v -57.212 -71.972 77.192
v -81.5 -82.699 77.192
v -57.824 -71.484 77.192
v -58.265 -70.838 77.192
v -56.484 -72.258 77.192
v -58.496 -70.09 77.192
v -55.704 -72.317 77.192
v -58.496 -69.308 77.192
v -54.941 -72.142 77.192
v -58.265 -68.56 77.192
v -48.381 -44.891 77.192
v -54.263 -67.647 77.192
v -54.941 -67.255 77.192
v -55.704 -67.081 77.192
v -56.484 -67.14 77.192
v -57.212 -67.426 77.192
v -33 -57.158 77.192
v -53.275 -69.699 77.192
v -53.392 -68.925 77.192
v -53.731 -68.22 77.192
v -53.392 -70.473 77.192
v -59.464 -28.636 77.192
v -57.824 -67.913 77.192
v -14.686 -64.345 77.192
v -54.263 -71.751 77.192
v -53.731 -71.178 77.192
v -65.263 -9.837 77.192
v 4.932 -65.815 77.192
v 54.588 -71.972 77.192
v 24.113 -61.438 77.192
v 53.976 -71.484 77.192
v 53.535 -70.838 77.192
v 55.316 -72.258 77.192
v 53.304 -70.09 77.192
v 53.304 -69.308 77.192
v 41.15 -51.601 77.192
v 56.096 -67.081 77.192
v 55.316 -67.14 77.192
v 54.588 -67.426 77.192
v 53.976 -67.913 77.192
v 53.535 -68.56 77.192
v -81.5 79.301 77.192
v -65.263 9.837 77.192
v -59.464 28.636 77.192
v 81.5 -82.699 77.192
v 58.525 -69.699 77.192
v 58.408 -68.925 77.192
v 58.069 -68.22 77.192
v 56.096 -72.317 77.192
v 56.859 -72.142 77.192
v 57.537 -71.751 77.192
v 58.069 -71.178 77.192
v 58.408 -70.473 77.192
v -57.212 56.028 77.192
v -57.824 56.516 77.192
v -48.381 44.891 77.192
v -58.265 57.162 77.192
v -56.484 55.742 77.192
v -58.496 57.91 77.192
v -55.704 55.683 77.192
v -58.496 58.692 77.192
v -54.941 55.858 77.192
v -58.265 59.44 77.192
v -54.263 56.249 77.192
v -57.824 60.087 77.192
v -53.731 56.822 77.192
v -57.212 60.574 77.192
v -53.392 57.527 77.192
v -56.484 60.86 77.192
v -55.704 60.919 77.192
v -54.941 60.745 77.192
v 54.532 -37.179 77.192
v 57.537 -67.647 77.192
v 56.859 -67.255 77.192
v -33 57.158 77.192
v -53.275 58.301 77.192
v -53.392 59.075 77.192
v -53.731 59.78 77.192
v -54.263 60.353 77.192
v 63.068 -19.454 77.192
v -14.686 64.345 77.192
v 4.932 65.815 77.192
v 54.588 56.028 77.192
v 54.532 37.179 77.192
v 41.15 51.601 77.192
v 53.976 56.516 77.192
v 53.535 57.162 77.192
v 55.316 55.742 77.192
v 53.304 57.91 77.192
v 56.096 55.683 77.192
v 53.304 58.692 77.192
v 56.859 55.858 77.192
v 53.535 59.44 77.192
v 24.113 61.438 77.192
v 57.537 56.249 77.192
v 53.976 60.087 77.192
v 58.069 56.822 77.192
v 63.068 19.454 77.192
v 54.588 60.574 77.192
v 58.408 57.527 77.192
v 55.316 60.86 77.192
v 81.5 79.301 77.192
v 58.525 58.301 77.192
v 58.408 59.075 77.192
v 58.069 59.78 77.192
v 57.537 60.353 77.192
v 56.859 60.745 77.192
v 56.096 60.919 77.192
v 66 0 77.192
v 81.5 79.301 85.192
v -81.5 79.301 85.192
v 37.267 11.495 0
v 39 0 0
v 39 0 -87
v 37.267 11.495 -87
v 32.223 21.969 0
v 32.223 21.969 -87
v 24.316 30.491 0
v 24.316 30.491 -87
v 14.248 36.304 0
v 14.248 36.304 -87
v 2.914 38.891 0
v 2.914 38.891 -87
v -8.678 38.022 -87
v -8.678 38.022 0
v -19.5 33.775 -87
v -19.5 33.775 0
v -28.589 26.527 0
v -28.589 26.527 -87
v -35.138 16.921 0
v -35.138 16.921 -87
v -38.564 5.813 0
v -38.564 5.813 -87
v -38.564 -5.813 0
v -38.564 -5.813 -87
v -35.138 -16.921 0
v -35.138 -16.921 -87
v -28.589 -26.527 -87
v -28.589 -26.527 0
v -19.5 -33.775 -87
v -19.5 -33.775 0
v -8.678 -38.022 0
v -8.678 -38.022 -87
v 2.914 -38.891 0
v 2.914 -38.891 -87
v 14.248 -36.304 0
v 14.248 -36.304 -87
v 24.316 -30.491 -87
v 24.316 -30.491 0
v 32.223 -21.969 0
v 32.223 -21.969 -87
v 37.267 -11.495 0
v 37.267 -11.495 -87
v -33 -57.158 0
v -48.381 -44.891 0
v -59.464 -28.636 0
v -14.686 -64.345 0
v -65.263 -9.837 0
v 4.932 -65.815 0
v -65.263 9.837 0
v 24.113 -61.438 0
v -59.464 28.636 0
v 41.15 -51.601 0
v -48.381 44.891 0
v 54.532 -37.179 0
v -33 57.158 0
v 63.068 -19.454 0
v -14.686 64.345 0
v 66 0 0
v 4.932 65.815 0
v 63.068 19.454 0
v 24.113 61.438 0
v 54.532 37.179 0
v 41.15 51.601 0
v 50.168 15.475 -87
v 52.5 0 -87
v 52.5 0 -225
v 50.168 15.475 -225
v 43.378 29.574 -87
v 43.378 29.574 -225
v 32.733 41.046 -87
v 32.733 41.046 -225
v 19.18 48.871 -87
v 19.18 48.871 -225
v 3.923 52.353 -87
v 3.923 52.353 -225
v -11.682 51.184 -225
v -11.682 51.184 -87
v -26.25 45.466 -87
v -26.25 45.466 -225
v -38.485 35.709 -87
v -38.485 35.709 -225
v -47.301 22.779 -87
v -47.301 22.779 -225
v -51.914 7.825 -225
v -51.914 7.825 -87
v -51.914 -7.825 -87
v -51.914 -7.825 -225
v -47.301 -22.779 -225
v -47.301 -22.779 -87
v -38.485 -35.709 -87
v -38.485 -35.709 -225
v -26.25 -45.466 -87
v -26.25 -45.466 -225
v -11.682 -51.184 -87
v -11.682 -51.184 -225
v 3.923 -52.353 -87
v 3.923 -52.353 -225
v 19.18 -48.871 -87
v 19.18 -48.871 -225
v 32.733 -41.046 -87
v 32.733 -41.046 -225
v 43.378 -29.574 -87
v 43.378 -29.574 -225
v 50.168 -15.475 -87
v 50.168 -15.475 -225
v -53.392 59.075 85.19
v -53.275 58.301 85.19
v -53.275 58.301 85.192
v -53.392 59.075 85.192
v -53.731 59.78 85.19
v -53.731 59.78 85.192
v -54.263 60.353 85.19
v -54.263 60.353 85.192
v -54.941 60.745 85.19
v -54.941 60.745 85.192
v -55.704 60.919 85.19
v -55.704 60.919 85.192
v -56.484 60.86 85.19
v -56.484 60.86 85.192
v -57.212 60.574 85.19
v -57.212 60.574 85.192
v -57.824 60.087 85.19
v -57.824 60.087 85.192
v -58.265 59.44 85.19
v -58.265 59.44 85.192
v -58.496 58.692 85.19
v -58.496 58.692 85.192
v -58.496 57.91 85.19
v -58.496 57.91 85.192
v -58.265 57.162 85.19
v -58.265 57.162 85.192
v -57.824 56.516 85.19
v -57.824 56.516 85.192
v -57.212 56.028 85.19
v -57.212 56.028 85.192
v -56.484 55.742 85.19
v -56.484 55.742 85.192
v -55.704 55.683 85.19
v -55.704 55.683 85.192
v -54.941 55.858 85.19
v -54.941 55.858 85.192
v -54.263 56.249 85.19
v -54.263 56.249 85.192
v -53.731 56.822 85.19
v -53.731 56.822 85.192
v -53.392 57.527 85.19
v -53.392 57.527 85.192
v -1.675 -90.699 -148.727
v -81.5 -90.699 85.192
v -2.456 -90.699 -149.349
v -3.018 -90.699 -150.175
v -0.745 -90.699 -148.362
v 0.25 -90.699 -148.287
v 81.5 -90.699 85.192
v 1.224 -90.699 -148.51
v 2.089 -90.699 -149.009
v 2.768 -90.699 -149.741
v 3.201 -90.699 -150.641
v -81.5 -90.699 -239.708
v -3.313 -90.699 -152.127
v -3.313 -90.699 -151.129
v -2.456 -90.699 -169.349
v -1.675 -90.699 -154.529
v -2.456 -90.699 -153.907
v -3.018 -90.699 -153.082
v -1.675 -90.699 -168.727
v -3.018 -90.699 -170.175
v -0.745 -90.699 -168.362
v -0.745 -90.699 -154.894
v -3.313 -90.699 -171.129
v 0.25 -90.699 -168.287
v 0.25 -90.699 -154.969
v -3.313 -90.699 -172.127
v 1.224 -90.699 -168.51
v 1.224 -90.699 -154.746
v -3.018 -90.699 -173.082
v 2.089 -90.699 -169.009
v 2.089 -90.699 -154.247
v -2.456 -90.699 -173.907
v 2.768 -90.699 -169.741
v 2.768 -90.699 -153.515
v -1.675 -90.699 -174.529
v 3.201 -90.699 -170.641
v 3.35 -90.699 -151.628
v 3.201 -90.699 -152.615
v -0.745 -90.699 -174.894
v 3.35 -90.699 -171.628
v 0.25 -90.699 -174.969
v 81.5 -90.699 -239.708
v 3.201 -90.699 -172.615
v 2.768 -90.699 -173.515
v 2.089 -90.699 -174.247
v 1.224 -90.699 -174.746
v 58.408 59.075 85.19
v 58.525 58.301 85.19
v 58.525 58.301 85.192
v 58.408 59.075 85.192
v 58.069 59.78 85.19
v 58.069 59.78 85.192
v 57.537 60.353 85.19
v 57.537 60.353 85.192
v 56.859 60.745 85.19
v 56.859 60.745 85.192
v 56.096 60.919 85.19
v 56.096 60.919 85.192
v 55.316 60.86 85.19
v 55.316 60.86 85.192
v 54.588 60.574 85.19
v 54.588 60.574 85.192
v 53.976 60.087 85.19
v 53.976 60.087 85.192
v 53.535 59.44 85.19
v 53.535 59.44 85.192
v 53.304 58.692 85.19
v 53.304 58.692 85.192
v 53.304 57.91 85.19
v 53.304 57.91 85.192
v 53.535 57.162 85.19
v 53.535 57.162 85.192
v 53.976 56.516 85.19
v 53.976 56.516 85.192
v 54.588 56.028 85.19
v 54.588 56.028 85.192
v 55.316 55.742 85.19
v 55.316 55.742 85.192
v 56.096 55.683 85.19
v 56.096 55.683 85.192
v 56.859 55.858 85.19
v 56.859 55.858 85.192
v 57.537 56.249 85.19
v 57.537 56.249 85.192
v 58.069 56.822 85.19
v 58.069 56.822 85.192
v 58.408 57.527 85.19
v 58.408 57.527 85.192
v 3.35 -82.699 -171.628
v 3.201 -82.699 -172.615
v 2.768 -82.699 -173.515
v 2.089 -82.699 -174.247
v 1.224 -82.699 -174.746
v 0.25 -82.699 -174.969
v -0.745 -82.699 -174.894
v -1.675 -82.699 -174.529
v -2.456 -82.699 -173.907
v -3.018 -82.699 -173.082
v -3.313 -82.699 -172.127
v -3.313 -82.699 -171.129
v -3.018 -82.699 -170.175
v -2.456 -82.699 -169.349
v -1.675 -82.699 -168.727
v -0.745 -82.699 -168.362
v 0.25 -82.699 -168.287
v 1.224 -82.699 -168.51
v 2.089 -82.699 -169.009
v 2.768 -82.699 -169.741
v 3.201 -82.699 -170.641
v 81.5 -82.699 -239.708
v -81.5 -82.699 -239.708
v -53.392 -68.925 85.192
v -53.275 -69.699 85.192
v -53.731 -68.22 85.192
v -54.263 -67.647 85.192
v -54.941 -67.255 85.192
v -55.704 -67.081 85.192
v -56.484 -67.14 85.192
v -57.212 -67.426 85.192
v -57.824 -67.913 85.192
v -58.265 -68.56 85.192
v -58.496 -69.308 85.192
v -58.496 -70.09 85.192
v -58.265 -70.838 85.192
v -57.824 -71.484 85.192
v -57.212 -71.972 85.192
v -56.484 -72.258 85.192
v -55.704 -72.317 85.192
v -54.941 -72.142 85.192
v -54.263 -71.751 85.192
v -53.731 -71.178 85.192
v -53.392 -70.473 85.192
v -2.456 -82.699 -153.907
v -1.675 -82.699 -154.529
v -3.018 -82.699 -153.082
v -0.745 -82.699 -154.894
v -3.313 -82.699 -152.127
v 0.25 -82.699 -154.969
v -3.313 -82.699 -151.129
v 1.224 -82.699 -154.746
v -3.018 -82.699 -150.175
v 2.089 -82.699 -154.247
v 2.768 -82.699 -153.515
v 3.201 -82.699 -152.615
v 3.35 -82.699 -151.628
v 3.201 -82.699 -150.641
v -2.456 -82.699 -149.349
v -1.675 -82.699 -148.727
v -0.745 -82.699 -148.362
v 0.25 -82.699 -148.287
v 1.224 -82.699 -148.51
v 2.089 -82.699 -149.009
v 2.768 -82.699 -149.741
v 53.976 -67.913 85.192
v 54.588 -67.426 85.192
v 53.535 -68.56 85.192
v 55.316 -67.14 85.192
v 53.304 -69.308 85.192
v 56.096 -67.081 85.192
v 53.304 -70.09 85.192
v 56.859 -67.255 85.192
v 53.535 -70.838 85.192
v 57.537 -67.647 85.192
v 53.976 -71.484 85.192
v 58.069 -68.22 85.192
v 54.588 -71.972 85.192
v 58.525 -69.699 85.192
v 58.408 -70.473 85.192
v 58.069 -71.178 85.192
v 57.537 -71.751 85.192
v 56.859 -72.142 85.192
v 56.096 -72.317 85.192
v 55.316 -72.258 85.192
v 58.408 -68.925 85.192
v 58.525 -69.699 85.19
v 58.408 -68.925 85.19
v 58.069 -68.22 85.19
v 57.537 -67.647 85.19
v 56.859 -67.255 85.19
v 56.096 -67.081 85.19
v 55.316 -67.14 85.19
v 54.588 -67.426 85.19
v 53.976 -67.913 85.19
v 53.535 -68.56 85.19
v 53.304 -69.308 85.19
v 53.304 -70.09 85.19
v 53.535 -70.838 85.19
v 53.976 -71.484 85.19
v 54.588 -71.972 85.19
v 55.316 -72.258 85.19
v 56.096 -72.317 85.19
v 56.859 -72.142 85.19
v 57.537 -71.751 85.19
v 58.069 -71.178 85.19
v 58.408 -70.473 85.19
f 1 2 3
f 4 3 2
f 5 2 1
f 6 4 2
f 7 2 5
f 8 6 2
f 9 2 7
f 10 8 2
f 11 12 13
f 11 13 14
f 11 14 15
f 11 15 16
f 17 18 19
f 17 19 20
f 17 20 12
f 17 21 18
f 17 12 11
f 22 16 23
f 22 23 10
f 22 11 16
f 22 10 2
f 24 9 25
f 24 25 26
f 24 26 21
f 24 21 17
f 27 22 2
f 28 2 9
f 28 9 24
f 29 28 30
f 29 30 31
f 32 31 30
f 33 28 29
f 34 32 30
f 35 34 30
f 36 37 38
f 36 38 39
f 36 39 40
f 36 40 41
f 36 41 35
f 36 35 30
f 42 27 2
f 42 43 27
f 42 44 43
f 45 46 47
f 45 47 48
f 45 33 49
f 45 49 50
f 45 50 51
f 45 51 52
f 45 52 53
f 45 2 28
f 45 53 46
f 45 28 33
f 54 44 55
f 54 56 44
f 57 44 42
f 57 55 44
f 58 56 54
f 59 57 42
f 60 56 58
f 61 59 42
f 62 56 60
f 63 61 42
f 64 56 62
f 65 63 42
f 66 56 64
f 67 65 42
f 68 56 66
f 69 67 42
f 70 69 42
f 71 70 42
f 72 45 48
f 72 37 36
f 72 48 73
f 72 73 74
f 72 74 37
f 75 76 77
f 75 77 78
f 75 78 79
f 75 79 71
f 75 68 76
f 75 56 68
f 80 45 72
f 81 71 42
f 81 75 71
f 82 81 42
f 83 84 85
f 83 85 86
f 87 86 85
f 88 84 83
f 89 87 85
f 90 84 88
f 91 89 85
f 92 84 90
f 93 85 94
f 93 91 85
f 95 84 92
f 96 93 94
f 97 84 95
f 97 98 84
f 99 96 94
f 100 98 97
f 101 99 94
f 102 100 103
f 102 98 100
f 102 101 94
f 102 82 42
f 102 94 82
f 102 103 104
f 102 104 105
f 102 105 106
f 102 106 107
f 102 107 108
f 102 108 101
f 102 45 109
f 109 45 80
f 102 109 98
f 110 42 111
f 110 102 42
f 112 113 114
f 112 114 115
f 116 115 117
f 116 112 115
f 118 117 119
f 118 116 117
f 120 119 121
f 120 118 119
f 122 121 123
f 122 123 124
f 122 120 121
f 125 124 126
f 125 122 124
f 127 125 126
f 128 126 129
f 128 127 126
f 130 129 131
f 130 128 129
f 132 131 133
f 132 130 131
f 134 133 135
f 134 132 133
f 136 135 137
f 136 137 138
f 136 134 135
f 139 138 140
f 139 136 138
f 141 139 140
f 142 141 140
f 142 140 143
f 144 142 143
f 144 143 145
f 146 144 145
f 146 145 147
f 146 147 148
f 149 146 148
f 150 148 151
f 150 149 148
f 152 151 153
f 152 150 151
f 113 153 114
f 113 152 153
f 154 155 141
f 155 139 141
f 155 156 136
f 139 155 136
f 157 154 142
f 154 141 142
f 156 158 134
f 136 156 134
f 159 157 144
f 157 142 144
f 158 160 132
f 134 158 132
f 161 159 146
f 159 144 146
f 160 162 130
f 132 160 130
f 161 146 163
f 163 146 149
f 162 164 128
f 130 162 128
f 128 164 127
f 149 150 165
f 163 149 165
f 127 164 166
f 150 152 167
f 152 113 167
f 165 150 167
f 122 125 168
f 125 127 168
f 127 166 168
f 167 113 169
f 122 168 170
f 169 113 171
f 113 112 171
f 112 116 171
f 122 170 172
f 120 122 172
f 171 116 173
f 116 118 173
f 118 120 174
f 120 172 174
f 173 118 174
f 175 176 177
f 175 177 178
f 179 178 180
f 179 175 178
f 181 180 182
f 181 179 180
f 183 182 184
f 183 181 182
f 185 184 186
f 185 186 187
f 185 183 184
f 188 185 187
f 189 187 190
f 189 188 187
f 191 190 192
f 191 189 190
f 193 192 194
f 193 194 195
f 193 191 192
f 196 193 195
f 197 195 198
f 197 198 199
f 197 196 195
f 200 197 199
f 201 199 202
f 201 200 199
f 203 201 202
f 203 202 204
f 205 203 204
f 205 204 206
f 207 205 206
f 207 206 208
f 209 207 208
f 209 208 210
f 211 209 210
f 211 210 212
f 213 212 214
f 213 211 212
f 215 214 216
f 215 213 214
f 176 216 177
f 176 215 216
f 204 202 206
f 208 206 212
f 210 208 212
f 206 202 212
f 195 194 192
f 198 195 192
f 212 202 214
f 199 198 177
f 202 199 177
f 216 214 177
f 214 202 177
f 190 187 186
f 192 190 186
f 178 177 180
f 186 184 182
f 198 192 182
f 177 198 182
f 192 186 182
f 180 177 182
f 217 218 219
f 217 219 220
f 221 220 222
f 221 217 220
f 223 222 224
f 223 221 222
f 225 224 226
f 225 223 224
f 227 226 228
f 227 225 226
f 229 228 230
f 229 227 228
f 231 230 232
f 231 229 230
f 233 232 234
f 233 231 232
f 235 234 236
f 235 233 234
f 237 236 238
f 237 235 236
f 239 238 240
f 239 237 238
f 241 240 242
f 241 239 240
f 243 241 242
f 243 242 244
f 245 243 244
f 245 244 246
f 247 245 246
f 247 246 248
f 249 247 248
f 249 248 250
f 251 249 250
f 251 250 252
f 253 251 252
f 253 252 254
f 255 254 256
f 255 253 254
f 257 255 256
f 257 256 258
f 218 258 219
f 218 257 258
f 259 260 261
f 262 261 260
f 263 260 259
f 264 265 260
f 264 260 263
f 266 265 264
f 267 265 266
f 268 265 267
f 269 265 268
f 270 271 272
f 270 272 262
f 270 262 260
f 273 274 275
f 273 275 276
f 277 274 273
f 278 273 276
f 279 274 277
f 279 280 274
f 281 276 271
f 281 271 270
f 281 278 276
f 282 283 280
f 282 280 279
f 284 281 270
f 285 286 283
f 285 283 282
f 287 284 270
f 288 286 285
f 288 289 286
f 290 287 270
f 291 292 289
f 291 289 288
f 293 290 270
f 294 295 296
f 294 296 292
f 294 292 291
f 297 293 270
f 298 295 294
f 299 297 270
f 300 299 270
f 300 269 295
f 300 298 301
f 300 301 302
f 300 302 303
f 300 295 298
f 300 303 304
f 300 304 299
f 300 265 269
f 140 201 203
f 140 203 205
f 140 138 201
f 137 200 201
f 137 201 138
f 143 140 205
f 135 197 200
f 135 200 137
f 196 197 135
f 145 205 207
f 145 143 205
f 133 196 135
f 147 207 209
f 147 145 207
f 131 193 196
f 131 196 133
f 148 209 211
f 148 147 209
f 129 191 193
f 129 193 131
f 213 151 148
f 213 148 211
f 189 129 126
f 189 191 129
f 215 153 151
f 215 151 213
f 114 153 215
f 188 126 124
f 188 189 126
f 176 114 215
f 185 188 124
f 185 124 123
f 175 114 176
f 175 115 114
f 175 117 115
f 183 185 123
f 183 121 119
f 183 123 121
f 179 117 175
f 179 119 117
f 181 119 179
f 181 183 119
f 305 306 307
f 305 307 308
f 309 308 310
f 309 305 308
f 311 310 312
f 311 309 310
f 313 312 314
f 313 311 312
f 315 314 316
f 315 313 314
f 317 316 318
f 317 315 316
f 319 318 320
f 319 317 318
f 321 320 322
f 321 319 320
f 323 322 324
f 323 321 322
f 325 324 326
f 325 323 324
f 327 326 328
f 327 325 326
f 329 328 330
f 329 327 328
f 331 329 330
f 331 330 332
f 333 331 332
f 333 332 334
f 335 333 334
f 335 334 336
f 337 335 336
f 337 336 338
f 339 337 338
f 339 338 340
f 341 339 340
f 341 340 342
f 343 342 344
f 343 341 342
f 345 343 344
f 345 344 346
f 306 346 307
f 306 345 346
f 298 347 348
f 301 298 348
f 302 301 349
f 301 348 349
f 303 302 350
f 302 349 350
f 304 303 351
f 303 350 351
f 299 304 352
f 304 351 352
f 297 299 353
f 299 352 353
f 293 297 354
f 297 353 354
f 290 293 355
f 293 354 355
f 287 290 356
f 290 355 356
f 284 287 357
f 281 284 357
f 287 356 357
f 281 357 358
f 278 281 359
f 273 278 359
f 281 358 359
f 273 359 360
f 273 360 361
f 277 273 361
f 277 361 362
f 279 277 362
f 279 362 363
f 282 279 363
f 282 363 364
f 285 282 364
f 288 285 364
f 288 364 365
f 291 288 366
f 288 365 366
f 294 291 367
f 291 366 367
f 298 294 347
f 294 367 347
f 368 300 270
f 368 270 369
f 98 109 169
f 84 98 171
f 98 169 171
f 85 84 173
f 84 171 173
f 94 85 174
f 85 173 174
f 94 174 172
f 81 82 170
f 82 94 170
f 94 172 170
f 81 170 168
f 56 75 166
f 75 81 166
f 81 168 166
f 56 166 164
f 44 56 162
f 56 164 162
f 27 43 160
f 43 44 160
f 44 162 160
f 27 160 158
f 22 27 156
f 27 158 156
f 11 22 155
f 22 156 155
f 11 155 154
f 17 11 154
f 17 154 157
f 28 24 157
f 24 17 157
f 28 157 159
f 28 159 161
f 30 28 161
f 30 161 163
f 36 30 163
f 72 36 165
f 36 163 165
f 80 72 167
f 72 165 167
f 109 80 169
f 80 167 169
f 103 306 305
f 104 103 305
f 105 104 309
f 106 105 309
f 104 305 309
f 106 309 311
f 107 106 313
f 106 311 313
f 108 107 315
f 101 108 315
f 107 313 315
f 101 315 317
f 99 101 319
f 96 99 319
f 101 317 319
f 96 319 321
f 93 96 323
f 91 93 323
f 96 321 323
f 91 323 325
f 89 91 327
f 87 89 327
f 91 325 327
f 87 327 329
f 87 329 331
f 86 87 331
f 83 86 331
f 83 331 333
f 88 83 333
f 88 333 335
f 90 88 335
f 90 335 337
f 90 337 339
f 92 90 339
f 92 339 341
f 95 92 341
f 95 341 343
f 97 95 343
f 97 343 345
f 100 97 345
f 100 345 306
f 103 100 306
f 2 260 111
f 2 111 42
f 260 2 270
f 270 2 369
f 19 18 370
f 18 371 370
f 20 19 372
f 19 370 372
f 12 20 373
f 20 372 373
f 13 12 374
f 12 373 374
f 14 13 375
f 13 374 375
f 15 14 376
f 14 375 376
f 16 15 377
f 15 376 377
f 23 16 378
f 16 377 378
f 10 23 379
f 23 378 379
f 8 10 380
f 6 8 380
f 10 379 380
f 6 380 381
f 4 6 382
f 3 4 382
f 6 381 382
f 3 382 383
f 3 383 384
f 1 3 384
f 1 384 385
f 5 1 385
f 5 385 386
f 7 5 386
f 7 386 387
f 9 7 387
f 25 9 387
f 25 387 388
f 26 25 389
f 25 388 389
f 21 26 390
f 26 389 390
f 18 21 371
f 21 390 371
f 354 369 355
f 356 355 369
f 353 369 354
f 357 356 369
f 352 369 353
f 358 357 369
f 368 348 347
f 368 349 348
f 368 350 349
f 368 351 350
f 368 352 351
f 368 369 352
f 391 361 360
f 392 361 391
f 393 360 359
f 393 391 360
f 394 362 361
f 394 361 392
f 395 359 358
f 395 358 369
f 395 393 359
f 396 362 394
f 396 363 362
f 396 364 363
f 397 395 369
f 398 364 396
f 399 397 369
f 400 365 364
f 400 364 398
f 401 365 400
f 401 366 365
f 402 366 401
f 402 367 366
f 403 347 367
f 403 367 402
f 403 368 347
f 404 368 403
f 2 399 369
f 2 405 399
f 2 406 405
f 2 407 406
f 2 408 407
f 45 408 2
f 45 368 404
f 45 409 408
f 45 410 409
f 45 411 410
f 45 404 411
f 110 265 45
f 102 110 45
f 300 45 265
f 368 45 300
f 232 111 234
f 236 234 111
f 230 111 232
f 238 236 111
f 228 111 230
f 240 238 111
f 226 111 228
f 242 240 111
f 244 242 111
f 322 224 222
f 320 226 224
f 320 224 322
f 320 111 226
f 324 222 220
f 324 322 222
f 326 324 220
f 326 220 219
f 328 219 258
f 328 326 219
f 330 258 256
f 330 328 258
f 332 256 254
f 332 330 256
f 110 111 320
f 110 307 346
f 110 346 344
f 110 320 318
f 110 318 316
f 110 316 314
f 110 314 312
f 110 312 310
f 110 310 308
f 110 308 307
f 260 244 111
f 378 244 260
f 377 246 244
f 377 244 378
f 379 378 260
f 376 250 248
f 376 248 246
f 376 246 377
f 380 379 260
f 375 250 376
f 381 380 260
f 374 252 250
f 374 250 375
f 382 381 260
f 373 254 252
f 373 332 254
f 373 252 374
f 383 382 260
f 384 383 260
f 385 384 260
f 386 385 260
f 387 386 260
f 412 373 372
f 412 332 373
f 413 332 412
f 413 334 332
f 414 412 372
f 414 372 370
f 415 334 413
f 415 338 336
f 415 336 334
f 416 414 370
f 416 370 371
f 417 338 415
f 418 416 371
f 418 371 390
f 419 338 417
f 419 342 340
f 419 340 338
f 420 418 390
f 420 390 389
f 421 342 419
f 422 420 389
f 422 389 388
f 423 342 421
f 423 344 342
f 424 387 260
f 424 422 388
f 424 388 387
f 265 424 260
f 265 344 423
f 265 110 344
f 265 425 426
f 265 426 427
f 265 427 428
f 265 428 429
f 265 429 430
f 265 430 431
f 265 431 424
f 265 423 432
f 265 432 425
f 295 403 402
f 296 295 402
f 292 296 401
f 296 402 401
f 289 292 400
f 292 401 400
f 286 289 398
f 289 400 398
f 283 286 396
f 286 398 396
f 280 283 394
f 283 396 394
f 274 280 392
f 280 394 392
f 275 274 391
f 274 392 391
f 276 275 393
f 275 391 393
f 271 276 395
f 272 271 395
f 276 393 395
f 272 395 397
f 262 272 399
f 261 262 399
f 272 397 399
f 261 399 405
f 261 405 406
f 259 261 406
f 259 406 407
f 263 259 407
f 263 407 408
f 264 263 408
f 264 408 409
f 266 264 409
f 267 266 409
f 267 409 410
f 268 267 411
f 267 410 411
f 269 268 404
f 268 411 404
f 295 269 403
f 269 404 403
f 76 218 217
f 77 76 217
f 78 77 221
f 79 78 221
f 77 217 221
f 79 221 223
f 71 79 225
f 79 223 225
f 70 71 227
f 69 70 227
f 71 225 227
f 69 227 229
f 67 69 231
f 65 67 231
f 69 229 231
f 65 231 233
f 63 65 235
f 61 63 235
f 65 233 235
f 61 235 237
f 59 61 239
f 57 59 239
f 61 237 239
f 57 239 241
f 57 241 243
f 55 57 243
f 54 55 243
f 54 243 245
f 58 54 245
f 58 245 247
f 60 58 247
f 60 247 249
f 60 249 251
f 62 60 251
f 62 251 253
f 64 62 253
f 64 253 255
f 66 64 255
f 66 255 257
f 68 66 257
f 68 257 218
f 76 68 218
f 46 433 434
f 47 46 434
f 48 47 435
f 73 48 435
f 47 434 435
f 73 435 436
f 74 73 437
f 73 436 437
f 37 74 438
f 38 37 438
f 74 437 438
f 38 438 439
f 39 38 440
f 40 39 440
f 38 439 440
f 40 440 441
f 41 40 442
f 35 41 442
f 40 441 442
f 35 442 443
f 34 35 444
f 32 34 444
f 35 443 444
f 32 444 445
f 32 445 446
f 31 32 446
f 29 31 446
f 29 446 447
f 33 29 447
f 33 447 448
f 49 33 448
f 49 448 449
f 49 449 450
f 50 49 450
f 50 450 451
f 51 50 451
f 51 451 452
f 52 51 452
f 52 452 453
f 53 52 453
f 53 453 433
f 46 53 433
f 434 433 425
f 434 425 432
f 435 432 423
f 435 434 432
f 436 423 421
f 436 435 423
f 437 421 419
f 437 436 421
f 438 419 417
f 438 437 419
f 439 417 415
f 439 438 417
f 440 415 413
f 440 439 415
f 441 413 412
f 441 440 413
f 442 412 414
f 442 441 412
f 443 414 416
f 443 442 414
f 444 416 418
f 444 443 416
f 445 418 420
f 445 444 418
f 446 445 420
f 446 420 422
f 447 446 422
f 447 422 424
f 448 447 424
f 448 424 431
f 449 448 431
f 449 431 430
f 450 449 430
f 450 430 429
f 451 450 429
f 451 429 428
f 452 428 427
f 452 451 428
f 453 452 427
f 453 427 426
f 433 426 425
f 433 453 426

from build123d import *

# Parameters (mm, degrees)
CROQUIS1_R              = 66
SALIENTE_EXTRUIR1_DEPTH = 80
CROQUIS2_R              = 39
SALIENTE_EXTRUIR2_DEPTH = 87
CROQUIS4_R              = 52.5
SALIENTE_EXTRUIR3_DEPTH = 138
SALIENTE_EXTRUIR4_DEPTH = 81.5
CROQUIS6_R              = 2.625
CORTAR_EXTRUIR1_DEPTH   = 81.5
SKETCH1_R               = 3.35
CUT_EXTRUDE1_DEPTH      = 8


with BuildPart() as part:
    # Croquis1 → Saliente-Extruir1 (new body)
    with BuildSketch(Plane.XY):
        Circle(CROQUIS1_R)
    extrude(amount=SALIENTE_EXTRUIR1_DEPTH)

    # Croquis2 → Saliente-Extruir2 (add)
    with BuildSketch(Plane.XY):
        Circle(CROQUIS2_R)
    extrude(amount=-SALIENTE_EXTRUIR2_DEPTH)

    # Croquis4 → Saliente-Extruir3 (add)
    with BuildSketch(Plane.XY.offset(-87)):
        Circle(CROQUIS4_R)
    extrude(amount=-SALIENTE_EXTRUIR3_DEPTH)

    # Croquis5 → Saliente-Extruir4 (add, symmetric)
    with BuildSketch(Plane(origin=(0, 0, 0), x_dir=(0, 0, -1), z_dir=(1, 0, 0))):
        Polygon((-77.192193157, 79.301093587), (-85.192193157, 79.301093587), (-85.192193157, -90.698906413), (239.707949332, -90.698906413), (239.707949332, -82.698906413), (-77.192193157, -82.698906413), align=None)
    extrude(amount=SALIENTE_EXTRUIR4_DEPTH, both=True)

    # Croquis6 → Cortar-Extruir1 (cut, symmetric)
    with BuildSketch(Plane.XY.offset(85.19)):
        with Locations((-55.9, 58.301093587)):
            Circle(CROQUIS6_R)
        with Locations((55.9, 58.301093587)):
            Circle(CROQUIS6_R)
        with Locations((55.9, -69.698906413)):
            Circle(CROQUIS6_R)
        with Locations((-55.9, -69.698906413)):
            Circle(CROQUIS6_R)
    extrude(amount=CORTAR_EXTRUIR1_DEPTH, both=True, mode=Mode.SUBTRACT)

    # Sketch1 → Cut-Extrude1 (cut)
    with BuildSketch(Plane(origin=(0, -82.698906413, 0), x_dir=(1, 0, 0), z_dir=(0, 1, 0))):
        with Locations((0, 151.628034649)):
            Circle(SKETCH1_R)
        with Locations((0, 171.628034649)):
            Circle(SKETCH1_R)
    extrude(amount=-CUT_EXTRUDE1_DEPTH, mode=Mode.SUBTRACT)


solid = part.part
